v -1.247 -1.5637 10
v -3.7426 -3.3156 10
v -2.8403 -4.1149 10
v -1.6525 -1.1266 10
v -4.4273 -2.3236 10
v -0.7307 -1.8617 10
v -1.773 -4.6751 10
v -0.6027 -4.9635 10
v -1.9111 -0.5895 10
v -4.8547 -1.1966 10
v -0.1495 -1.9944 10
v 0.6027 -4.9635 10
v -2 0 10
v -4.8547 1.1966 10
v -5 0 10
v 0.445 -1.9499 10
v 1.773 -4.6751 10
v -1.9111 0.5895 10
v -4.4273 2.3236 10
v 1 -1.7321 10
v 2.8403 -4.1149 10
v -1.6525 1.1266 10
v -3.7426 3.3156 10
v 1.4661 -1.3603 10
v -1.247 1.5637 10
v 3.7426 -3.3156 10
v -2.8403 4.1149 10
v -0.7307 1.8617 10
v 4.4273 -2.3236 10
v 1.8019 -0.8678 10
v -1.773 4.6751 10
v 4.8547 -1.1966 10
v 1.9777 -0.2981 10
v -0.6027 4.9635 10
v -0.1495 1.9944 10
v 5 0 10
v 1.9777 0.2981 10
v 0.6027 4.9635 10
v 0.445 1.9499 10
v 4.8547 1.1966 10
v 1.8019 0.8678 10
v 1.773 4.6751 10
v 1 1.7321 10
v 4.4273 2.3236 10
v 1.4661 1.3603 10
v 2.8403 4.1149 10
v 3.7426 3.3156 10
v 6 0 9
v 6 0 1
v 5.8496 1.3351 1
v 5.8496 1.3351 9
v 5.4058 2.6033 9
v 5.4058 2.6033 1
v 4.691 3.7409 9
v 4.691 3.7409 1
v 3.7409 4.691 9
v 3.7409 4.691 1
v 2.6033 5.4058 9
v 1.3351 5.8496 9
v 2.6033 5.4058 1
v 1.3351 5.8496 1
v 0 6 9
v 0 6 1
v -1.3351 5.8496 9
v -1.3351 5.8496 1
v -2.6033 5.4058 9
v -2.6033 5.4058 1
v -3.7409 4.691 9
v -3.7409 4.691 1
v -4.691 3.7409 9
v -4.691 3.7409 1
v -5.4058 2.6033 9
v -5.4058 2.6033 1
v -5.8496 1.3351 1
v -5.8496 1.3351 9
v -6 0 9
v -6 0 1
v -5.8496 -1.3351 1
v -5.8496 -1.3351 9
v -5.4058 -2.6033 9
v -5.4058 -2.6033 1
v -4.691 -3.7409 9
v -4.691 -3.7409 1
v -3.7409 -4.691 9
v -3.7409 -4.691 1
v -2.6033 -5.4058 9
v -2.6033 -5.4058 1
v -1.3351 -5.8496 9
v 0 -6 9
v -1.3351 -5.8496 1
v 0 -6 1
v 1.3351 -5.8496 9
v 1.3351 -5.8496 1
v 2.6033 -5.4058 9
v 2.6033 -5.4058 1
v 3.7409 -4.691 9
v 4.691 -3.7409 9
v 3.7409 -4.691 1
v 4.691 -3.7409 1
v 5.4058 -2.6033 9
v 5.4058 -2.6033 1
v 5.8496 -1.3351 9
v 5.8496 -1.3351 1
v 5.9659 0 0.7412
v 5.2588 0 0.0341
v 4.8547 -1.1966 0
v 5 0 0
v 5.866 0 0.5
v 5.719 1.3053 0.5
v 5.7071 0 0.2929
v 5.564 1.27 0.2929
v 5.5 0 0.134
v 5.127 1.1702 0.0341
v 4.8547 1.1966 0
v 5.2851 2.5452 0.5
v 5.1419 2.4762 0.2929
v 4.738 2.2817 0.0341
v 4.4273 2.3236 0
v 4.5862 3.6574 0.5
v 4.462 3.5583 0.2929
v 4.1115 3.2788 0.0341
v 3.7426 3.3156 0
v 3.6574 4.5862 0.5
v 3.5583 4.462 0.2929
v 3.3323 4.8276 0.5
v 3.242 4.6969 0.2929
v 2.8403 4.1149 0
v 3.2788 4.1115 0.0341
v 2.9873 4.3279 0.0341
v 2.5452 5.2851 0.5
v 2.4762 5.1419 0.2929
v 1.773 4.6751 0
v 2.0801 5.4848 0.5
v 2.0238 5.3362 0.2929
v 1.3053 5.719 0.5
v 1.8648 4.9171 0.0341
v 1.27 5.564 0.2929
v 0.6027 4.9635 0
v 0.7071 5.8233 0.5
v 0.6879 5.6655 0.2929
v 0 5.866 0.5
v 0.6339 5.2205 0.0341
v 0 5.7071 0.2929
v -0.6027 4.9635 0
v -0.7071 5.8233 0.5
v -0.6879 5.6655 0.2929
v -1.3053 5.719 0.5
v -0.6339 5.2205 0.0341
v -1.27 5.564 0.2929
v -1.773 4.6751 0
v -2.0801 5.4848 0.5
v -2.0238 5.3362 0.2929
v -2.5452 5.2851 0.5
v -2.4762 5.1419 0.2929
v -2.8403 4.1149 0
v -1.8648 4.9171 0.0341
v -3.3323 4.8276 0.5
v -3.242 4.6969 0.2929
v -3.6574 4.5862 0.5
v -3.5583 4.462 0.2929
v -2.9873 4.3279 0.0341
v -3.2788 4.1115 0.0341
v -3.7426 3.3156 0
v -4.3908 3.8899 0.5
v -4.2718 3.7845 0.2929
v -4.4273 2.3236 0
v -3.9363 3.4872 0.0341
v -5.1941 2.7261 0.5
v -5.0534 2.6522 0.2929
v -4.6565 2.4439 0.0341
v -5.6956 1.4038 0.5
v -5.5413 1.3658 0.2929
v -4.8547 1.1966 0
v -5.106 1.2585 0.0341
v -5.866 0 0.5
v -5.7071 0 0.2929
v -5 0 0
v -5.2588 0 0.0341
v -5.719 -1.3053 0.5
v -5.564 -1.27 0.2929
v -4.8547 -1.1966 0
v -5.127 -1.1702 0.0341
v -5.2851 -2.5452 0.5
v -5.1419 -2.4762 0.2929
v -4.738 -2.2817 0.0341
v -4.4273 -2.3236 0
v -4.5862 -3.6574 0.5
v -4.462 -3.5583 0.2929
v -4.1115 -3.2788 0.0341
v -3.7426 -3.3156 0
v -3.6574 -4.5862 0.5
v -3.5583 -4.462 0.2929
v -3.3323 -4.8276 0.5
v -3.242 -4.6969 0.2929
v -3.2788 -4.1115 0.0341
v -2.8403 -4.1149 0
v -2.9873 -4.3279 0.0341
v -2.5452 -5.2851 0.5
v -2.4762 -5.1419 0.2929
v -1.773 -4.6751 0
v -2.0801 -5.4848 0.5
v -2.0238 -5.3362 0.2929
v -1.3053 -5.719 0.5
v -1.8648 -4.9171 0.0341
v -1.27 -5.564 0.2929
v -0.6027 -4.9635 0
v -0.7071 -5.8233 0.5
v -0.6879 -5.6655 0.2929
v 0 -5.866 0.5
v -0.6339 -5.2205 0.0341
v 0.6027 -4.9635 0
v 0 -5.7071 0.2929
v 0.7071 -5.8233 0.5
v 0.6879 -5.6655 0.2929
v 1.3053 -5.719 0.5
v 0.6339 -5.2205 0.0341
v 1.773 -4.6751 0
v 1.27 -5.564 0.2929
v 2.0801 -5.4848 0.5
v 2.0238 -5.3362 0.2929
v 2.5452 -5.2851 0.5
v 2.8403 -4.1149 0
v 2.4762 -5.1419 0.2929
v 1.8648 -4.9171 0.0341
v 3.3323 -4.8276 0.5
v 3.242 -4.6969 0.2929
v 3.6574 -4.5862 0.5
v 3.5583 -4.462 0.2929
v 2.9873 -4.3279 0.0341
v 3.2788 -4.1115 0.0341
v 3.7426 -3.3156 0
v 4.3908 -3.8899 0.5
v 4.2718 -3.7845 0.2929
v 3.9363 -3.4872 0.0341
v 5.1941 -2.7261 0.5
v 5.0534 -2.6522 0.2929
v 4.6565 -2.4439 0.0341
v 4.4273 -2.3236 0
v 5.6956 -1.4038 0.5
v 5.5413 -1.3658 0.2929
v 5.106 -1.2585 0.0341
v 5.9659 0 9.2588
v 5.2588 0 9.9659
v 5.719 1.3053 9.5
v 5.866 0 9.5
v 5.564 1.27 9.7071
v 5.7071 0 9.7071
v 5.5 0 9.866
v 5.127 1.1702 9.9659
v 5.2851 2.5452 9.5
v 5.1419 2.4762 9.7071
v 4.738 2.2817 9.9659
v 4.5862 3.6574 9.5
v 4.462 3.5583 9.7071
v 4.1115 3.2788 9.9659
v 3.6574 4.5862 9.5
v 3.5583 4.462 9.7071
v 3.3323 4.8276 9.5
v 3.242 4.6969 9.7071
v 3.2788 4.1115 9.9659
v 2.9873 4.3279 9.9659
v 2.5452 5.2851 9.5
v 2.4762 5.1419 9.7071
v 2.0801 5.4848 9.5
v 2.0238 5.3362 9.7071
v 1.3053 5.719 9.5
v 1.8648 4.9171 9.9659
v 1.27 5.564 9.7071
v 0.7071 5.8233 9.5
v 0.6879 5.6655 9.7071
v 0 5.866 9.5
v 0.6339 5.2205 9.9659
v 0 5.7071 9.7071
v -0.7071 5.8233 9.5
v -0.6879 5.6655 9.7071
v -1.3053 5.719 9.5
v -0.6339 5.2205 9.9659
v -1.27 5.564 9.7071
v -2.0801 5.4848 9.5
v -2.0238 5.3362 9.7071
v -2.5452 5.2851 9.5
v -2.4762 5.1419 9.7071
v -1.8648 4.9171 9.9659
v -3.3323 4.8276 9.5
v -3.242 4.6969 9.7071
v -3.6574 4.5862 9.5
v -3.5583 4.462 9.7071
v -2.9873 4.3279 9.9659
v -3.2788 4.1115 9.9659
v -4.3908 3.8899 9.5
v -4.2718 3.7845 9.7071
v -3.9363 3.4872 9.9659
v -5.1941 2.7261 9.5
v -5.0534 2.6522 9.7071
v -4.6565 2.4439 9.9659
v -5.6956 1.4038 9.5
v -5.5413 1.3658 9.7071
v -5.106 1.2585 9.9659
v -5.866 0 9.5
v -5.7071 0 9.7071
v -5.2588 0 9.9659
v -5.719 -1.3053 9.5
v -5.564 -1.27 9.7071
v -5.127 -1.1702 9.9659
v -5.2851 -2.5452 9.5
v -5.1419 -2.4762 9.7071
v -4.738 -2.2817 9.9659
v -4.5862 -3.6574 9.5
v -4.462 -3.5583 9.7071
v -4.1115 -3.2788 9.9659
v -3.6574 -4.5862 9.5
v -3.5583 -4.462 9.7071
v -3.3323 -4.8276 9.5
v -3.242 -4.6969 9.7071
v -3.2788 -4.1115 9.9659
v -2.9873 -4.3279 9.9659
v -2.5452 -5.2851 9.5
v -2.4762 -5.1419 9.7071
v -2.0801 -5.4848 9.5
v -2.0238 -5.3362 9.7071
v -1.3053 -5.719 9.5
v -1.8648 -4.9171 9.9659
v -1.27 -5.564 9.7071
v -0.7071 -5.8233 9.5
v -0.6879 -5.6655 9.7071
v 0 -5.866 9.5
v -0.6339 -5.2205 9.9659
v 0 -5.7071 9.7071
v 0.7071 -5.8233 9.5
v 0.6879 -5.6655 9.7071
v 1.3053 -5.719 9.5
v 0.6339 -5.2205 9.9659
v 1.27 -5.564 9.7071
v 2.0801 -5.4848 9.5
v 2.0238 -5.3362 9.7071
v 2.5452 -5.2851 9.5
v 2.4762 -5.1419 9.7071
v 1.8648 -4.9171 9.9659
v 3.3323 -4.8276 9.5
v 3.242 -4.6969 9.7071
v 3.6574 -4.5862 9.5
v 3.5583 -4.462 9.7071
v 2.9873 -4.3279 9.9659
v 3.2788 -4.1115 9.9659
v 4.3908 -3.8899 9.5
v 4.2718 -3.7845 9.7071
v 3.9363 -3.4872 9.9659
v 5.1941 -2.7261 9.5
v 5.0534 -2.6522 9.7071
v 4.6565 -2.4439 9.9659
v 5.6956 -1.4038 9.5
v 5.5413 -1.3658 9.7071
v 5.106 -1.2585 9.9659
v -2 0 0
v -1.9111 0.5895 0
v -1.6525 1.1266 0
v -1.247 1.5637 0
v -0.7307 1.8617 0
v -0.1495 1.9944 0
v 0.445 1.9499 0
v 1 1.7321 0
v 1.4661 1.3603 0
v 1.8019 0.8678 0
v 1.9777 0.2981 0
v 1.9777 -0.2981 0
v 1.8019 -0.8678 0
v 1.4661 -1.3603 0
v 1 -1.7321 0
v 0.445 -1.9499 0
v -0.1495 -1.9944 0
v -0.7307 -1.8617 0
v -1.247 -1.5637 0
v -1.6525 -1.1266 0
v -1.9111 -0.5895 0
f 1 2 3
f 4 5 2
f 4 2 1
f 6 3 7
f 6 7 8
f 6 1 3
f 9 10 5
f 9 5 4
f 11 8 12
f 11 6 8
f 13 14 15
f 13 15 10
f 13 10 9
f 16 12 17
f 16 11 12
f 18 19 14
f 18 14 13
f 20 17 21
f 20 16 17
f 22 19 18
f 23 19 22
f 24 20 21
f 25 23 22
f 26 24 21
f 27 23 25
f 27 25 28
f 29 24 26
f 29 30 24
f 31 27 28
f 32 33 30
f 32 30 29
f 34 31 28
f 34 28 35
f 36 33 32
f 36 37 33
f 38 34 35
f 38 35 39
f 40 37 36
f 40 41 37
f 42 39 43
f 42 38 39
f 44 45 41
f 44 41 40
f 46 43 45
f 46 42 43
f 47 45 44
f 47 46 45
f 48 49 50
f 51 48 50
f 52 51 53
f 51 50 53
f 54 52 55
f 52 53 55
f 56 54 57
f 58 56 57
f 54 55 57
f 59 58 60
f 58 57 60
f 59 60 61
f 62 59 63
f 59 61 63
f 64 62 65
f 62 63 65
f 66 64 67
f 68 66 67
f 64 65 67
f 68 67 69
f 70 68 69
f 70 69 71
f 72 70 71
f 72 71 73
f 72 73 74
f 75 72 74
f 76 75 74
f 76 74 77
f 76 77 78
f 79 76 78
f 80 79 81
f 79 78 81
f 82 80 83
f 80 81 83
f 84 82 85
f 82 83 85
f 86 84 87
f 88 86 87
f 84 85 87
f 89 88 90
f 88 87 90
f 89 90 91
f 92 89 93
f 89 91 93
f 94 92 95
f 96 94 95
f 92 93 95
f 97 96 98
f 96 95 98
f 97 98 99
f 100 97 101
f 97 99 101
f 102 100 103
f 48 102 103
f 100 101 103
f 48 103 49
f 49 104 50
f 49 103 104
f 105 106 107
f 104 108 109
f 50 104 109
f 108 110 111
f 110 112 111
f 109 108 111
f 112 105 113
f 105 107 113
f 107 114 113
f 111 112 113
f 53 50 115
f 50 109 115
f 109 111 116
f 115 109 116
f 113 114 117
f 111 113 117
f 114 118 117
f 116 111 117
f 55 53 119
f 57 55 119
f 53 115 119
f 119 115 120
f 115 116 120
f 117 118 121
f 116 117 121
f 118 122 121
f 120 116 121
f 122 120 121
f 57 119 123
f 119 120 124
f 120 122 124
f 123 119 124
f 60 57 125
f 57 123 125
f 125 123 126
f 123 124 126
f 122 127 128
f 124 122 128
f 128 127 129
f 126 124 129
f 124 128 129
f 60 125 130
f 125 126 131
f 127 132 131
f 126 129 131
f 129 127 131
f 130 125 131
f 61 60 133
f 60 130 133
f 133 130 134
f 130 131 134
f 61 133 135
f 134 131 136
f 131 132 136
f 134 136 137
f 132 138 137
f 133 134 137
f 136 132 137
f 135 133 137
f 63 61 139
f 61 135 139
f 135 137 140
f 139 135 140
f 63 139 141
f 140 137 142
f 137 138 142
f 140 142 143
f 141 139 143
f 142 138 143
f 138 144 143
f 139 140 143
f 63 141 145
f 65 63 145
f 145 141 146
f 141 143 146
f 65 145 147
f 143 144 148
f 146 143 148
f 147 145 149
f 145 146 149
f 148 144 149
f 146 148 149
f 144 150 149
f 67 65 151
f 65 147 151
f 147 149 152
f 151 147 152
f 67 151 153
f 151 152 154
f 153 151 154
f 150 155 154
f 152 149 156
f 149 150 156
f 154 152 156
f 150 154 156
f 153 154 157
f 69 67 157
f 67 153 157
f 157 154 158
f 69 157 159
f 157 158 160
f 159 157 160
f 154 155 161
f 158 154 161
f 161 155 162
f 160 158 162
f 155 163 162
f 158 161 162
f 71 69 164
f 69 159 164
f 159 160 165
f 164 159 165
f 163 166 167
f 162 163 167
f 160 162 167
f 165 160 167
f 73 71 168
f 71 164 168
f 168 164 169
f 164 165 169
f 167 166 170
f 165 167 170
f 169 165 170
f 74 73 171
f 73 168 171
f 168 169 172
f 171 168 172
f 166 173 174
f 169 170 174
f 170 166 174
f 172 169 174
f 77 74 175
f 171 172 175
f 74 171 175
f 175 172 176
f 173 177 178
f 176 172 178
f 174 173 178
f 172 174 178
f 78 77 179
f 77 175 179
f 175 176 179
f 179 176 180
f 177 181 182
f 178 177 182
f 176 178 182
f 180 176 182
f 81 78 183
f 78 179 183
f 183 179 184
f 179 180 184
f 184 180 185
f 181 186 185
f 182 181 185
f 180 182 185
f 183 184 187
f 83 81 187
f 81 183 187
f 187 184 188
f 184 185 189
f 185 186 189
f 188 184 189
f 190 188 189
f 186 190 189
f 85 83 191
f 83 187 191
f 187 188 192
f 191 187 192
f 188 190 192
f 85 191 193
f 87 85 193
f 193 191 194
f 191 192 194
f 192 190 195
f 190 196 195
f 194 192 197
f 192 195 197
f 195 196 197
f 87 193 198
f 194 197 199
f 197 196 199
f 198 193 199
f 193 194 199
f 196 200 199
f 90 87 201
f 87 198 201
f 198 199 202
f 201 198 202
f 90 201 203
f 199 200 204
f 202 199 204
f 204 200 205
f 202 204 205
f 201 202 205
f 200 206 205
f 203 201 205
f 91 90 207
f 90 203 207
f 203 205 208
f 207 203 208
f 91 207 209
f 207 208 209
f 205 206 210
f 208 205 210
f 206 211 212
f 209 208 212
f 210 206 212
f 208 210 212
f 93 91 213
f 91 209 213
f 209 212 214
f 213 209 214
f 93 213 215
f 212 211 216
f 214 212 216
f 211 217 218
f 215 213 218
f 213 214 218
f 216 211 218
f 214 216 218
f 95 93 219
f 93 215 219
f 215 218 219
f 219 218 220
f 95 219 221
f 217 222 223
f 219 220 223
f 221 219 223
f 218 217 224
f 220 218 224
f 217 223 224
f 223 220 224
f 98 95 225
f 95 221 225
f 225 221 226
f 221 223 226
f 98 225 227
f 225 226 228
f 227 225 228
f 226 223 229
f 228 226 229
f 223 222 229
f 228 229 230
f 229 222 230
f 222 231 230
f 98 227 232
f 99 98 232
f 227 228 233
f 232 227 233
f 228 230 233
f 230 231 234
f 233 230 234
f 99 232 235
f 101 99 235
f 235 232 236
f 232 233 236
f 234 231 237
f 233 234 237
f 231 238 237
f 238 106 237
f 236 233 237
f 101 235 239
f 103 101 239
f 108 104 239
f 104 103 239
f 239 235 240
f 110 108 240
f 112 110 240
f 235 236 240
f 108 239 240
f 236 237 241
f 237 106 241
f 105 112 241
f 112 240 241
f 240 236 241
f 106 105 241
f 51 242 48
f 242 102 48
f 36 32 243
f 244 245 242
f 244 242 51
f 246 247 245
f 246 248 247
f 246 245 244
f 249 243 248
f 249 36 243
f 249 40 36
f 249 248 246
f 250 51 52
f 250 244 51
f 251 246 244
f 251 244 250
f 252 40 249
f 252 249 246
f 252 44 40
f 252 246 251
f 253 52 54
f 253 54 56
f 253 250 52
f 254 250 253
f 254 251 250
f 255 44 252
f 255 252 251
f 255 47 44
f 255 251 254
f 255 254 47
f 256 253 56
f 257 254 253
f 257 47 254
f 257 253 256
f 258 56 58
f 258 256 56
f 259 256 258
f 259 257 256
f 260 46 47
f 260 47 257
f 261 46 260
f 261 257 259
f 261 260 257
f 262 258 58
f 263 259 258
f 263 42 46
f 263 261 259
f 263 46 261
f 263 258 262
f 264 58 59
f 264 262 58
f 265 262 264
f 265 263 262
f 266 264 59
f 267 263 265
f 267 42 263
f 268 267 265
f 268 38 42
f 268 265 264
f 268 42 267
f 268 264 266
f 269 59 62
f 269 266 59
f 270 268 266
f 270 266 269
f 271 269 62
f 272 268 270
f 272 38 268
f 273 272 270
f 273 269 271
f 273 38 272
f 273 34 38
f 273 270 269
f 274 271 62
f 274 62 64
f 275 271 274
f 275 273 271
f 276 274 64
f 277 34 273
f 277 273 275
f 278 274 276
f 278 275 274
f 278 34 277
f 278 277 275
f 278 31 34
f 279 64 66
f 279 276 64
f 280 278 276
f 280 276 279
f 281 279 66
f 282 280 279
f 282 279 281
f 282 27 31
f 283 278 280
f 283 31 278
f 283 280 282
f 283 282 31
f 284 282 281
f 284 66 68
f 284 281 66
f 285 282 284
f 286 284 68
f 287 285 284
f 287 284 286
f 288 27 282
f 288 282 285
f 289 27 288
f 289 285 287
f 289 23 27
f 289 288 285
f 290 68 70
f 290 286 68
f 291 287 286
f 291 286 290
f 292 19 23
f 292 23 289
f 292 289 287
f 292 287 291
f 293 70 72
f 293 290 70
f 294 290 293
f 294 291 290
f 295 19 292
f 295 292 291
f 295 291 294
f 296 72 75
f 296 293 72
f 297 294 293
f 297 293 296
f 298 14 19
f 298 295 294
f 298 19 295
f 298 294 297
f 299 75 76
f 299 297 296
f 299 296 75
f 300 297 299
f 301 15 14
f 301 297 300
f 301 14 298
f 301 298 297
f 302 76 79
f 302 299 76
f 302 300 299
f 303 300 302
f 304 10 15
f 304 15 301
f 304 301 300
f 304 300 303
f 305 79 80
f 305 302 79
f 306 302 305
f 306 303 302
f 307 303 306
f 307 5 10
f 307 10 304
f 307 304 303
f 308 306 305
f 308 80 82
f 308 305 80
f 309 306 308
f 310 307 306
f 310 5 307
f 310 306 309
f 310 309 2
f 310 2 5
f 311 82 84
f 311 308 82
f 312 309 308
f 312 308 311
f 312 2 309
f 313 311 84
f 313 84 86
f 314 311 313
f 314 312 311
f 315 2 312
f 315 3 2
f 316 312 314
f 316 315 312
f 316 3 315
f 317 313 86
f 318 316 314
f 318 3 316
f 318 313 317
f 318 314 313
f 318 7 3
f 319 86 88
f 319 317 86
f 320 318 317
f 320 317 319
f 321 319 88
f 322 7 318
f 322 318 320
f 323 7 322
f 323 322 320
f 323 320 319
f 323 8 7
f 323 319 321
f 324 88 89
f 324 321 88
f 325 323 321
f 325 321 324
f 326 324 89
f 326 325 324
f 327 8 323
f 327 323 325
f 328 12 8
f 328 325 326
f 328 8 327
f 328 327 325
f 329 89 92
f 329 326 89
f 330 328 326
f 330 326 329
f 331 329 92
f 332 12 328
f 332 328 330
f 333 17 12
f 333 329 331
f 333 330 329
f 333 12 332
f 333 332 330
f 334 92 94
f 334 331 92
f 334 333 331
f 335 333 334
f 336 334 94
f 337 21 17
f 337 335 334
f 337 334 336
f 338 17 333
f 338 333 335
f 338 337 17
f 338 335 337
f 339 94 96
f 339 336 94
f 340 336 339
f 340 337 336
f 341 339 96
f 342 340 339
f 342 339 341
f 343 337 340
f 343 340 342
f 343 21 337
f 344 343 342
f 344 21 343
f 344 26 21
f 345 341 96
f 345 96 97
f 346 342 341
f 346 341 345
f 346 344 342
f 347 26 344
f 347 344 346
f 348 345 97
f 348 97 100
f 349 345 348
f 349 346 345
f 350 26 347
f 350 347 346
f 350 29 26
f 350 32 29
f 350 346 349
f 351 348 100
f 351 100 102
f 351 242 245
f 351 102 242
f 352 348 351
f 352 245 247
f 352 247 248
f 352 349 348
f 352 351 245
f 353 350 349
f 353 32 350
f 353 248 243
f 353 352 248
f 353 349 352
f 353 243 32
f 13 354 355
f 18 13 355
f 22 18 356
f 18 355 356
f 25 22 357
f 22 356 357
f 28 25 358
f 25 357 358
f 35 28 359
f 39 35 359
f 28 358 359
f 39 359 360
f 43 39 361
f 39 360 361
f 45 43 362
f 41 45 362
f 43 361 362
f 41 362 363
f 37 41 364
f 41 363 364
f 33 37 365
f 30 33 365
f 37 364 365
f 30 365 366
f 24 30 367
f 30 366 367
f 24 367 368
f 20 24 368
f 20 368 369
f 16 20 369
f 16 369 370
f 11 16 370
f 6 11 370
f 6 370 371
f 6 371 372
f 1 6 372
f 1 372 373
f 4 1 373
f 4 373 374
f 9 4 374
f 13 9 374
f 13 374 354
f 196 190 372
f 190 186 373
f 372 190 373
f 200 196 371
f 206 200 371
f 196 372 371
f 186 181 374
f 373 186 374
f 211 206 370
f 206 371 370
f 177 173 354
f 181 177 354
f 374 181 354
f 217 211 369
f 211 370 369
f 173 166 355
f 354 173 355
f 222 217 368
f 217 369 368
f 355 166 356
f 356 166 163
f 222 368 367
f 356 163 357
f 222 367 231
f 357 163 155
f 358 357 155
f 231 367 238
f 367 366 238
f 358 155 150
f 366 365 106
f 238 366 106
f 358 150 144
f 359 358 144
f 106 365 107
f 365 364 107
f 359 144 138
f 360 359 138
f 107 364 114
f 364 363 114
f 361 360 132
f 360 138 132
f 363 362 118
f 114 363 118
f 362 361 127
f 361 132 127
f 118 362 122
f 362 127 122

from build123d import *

# Parameters (mm, degrees)
SKETCH_1_R          = 6
EXTRUDE_1_DEPTH     = 10
SKETCH_2_R          = 2
CUT_EXTRUDE_1_DEPTH = 11
FILLET_1_R          = 1


with BuildPart() as part:
    # 草图1 → 凸台-拉伸1 (new body)
    with BuildSketch(Plane.XY):
        Circle(SKETCH_1_R)
    extrude(amount=EXTRUDE_1_DEPTH)

    # 草图2 → 切除-拉伸1 (cut, through all)
    with BuildSketch(Plane(origin=(0, 0, 0), x_dir=(-1, 0, 0), z_dir=(0, 0, -1))):
        Circle(SKETCH_2_R)
    extrude(amount=-CUT_EXTRUDE_1_DEPTH, mode=Mode.SUBTRACT)

    # 圆角1
    fillet_1_edges = [part.edges().sort_by_distance(p)[0] for p in [
        (-6, 0, 0),
        (-6, 0, 10),
    ]]
    fillet(fillet_1_edges, radius=FILLET_1_R)


solid = part.part
